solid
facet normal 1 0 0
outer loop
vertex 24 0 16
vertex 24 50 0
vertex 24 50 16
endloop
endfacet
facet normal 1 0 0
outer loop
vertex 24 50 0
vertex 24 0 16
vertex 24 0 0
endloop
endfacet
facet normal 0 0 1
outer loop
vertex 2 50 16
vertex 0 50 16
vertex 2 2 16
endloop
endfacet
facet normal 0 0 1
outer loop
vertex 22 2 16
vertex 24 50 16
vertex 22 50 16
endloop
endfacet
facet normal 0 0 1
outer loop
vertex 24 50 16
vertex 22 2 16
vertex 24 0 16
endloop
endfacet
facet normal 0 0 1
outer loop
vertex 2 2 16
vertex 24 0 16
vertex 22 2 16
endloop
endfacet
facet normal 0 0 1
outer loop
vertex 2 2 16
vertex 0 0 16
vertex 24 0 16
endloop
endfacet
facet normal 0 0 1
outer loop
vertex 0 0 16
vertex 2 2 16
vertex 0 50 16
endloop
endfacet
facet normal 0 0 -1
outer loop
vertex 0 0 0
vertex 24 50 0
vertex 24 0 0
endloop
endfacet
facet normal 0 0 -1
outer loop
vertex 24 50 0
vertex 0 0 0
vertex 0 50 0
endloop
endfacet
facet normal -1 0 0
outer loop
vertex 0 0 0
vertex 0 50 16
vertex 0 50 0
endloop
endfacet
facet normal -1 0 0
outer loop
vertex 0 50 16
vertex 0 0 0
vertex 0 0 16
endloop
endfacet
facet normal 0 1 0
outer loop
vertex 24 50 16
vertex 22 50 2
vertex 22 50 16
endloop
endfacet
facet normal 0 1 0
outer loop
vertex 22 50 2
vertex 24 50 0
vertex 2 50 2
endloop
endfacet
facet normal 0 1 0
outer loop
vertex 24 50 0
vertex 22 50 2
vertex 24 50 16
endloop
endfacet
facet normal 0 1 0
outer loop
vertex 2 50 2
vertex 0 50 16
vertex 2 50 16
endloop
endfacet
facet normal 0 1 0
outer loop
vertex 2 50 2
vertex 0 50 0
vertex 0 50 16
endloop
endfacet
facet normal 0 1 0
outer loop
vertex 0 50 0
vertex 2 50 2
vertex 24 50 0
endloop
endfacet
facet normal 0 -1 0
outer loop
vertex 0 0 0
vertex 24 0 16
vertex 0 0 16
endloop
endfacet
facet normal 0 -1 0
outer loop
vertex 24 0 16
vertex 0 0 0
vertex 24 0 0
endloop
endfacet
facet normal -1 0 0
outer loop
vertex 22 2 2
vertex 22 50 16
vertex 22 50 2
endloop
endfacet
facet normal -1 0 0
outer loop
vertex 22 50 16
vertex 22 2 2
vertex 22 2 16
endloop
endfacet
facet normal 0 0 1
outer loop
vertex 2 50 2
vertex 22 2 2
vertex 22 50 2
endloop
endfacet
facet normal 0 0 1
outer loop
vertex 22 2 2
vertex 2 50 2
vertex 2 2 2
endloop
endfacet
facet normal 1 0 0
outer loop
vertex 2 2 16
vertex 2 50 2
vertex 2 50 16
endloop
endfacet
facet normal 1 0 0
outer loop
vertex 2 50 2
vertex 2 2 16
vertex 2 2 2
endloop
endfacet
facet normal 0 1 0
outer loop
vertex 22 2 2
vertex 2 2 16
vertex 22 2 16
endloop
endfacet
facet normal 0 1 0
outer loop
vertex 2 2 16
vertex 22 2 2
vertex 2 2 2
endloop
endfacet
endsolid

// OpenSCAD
//==================================================
// CableCover
//==================================================

cover_length = 50;
cover_width  = 24;

cover_height = 16;
cover_wall   = 2;



module cable_cover()
{

    difference()
    {

        //--------------------------------------------------
        // Outer
        //--------------------------------------------------

        cube([
            cover_width,
            cover_length,
            cover_height
        ]);


        //--------------------------------------------------
        // Hollow
        //--------------------------------------------------

        translate([
            cover_wall,
            cover_wall,
            cover_wall
        ])

        cube([
            cover_width  - (2*cover_wall),
            cover_length - cover_wall+1,
            cover_height
        ]);

    }

}
cable_cover();
